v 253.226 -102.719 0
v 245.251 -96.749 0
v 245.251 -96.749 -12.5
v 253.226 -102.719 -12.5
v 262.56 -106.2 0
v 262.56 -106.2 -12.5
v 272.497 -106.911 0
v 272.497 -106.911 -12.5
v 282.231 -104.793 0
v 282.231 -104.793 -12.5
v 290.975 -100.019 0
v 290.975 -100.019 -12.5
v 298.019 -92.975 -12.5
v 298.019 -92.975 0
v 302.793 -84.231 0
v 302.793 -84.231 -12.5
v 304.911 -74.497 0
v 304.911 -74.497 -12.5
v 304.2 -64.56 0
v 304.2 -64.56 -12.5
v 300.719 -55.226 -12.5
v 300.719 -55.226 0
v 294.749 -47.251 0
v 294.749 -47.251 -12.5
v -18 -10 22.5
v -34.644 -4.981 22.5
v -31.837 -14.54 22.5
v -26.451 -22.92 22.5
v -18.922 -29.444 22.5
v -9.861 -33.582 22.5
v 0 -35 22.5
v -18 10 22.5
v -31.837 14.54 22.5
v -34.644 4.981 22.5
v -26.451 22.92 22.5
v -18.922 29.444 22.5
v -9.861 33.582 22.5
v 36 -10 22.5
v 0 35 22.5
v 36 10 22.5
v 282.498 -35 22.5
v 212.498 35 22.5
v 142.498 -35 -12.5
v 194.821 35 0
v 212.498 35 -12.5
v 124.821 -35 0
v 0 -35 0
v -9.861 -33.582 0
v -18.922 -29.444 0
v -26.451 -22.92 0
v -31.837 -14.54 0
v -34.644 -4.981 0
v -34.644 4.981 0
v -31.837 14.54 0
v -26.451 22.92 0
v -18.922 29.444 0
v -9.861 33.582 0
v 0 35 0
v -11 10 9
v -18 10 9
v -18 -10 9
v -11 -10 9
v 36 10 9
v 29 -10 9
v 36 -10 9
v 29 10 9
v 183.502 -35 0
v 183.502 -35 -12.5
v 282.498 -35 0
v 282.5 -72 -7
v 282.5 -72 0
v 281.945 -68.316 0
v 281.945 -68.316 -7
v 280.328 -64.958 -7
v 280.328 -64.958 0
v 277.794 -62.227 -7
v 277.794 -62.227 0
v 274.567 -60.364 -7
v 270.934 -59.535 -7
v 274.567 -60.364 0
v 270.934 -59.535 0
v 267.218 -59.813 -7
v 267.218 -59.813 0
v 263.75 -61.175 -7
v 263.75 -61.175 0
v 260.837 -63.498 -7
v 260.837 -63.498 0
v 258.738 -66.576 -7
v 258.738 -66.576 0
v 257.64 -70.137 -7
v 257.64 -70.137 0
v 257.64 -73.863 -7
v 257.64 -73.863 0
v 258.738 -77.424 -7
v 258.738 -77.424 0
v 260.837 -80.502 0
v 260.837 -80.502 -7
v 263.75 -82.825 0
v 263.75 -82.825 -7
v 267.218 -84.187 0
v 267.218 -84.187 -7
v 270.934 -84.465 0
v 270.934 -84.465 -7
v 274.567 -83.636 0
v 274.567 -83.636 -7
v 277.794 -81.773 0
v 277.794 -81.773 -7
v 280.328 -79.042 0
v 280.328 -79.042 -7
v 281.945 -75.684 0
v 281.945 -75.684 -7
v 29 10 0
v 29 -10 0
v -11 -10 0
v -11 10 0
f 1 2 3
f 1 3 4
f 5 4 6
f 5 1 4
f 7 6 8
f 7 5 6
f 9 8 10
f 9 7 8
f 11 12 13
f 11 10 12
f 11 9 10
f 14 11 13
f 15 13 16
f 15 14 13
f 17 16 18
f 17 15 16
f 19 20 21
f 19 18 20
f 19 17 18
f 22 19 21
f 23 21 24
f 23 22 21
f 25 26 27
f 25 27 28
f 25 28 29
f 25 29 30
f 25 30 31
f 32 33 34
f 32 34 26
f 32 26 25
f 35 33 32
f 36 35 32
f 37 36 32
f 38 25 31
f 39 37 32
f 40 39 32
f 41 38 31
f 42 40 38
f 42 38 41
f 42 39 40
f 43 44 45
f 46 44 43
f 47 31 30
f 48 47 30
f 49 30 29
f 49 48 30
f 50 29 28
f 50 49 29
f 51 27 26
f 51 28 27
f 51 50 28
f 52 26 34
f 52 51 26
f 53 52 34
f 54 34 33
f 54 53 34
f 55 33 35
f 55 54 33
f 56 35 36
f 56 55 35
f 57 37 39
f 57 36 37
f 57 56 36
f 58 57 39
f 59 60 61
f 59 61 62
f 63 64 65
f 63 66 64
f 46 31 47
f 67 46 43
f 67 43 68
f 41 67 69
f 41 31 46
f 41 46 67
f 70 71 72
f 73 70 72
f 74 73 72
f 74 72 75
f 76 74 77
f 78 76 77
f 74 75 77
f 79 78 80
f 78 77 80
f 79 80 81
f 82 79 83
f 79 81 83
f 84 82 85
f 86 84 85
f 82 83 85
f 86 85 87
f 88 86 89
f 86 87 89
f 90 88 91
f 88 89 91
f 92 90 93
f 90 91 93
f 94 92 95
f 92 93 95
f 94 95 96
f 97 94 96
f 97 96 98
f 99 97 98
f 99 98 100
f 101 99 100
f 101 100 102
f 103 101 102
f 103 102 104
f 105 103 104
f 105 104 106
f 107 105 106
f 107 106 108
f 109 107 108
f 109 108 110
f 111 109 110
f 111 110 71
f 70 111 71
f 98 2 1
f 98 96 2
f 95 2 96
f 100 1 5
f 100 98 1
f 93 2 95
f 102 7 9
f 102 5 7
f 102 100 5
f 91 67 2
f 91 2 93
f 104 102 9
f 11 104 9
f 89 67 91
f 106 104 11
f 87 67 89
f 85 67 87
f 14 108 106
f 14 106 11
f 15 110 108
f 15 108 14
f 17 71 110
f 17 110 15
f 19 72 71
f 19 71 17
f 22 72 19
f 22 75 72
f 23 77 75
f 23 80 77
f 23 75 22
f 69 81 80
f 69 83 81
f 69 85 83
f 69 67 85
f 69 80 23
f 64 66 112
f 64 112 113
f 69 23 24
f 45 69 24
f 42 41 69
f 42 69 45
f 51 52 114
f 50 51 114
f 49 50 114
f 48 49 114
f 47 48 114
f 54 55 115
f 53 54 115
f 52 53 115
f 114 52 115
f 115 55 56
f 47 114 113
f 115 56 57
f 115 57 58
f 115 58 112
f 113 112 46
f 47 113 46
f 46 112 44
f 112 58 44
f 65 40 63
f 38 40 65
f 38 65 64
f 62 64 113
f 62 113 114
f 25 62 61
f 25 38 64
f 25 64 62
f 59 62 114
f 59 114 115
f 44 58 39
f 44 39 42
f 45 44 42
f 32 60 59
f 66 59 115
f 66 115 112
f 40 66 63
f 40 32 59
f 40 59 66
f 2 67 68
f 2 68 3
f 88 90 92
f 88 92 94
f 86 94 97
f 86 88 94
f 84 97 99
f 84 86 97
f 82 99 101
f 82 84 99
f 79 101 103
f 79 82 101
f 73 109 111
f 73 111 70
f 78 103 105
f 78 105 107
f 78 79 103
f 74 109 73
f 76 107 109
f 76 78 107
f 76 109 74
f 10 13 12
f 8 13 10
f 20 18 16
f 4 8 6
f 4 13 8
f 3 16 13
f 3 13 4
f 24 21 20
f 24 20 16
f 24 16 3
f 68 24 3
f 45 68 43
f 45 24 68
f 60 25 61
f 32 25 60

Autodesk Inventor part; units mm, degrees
ref_plane "YZ Plane" through (0, 0, 0) normal (1, 0, 0) x (0, 1, 0)
ref_plane "XZ Plane" through (0, 0, 0) normal (0, 1, 0) x (-1, 0, 0)
ref_plane "XY Plane" through (0, 0, 0) normal (0, 0, 1) x (1, 0, 0)
sketch "Sketch1" plane through (0, 0, 0) normal (0, 0, 1) x (1, 0, 0)
  circle A0 centre (0, 0) radius 35
  circle A1 centre (270, -72) radius 35
  line L0 (0, 35) -> (212.4975, 35)
  line L1 (212.4975, 35) -> (294.7487, -47.2513)
  line L2 (0, -35) -> (183.5025, -35)
  line L3 (183.5025, -35) -> (245.2513, -96.7487)
  dimension "d0" = 70
  dimension "d1" = 70
  dimension "d2" = 135
  dimension "d3" = 37
  dimension "d4" = 270
extrude "Extrusion1" add sketch "Sketch1" along normal blind 22.5
sketch "Sketch2" plane through (0, 0, 22.5) normal (0, 0, 1) x (1, 0, 0)
  circle A0 centre (0, 0) radius 2.5
  line L0 (-18, 10) -> (29, 10)
  line L1 (29, 10) -> (29, -10)
  line L2 (29, -10) -> (-18, -10)
  line L3 (-18, -10) -> (-18, 10)
  line L4 (-11, 10) -> (36, 10)
  line L5 (36, 10) -> (36, -10)
  line L6 (36, -10) -> (-11, -10)
  line L7 (-11, -10) -> (-11, 10)
  line L8 (-18, 0) -> (36, 0) construction
  point P0 (29, 10)
  dimension "d7" = 5
  dimension "d9" = 54
  dimension "d10" = 40
  dimension "d11" = 7
  dimension "d12" = 36
  dimension "d13" = 20
extrude "Extrusion2" cut sketch "Sketch2" against normal through all contours A0 | L0 L1 L2 L7
extrude "Extrusion3" cut sketch "Sketch2" against normal blind 13.5 contours L0 L7 L2 L3 | L4 L5 L6 L1
sketch "Sketch3" plane through (0, 0, 0) normal (0, 0, -1) x (-1, 0, 0)
  arc A0 (-294.7487, -47.2513) -> (-245.2513, -96.7487) centre (-270, -72) ccw projected
  line L0 (-183.5025, -35) -> (-245.2513, -96.7487) projected
  line L1 (0, -35) -> (-183.5025, -35) projected
  arc A1 (0, -35) -> (0, 35) centre (0, 0) ccw projected
  line L2 (-212.4975, 35) -> (0, 35) projected
  line L3 (-294.7487, -47.2513) -> (-212.4975, 35) projected
  line L4 (0, -35) -> (-183.5025, -35) projected
  line L5 (-212.4975, 35) -> (-142.4975, -35)
  point P0 (-142.4975, -35)
  dimension "d18" = 135
extrude "Extrusion4" add sketch "Sketch3" along normal blind 12.5 contours L3 L5 L1 L0 A0
chamfer "Chamfer1" distance 12.5 angle 45 1 edges at (177.4975, 0, 0)
sketch "Sketch4" plane through (0, 0, 22.5) normal (0, 0, 1) x (1, 0, 0)
  line L0 (183.5025, -35) -> (245.2513, -96.7487) projected
  arc A0 (245.2513, -96.7487) -> (294.7487, -47.2513) centre (270, -72) ccw projected
  line L1 (294.7487, -47.2513) -> (212.4975, 35) projected
  line L2 (212.4975, 35) -> (0, 35) projected
  arc A1 (0, 35) -> (0, -35) centre (0, 0) ccw projected
  line L3 (0, -35) -> (183.5025, -35) projected
  line L4 (183.5025, -35) -> (245.2513, -96.7487) projected
  line L5 (-18, 10) -> (36, 10) projected
  line L6 (36, 10) -> (36, -10) projected
  line L7 (36, -10) -> (-18, -10) projected
  line L8 (-18, -10) -> (-18, 10) projected
  line L9 (245.2513, -96.7487) -> (183.5025, -35) projected
  line L10 (183.5025, -35) -> (282.4975, -35)
extrude "Extrusion5" cut sketch "Sketch4" against normal blind 22.5 contours L10 L1 A0 L0
sketch "Sketch5" plane through (0, 0, 0) normal (0, 0, 1) x (1, 0, 0)
  arc A0 (245.2513, -96.7487) -> (294.7487, -47.2513) centre (270, -72) ccw projected
  circle A1 centre (270, -72) radius 12.5
  point P0 (0, 0)
  dimension "d26" = 25
extrude "Extrusion6" cut sketch "Sketch5" against normal blind 7
properties part number "arm 1 right"
